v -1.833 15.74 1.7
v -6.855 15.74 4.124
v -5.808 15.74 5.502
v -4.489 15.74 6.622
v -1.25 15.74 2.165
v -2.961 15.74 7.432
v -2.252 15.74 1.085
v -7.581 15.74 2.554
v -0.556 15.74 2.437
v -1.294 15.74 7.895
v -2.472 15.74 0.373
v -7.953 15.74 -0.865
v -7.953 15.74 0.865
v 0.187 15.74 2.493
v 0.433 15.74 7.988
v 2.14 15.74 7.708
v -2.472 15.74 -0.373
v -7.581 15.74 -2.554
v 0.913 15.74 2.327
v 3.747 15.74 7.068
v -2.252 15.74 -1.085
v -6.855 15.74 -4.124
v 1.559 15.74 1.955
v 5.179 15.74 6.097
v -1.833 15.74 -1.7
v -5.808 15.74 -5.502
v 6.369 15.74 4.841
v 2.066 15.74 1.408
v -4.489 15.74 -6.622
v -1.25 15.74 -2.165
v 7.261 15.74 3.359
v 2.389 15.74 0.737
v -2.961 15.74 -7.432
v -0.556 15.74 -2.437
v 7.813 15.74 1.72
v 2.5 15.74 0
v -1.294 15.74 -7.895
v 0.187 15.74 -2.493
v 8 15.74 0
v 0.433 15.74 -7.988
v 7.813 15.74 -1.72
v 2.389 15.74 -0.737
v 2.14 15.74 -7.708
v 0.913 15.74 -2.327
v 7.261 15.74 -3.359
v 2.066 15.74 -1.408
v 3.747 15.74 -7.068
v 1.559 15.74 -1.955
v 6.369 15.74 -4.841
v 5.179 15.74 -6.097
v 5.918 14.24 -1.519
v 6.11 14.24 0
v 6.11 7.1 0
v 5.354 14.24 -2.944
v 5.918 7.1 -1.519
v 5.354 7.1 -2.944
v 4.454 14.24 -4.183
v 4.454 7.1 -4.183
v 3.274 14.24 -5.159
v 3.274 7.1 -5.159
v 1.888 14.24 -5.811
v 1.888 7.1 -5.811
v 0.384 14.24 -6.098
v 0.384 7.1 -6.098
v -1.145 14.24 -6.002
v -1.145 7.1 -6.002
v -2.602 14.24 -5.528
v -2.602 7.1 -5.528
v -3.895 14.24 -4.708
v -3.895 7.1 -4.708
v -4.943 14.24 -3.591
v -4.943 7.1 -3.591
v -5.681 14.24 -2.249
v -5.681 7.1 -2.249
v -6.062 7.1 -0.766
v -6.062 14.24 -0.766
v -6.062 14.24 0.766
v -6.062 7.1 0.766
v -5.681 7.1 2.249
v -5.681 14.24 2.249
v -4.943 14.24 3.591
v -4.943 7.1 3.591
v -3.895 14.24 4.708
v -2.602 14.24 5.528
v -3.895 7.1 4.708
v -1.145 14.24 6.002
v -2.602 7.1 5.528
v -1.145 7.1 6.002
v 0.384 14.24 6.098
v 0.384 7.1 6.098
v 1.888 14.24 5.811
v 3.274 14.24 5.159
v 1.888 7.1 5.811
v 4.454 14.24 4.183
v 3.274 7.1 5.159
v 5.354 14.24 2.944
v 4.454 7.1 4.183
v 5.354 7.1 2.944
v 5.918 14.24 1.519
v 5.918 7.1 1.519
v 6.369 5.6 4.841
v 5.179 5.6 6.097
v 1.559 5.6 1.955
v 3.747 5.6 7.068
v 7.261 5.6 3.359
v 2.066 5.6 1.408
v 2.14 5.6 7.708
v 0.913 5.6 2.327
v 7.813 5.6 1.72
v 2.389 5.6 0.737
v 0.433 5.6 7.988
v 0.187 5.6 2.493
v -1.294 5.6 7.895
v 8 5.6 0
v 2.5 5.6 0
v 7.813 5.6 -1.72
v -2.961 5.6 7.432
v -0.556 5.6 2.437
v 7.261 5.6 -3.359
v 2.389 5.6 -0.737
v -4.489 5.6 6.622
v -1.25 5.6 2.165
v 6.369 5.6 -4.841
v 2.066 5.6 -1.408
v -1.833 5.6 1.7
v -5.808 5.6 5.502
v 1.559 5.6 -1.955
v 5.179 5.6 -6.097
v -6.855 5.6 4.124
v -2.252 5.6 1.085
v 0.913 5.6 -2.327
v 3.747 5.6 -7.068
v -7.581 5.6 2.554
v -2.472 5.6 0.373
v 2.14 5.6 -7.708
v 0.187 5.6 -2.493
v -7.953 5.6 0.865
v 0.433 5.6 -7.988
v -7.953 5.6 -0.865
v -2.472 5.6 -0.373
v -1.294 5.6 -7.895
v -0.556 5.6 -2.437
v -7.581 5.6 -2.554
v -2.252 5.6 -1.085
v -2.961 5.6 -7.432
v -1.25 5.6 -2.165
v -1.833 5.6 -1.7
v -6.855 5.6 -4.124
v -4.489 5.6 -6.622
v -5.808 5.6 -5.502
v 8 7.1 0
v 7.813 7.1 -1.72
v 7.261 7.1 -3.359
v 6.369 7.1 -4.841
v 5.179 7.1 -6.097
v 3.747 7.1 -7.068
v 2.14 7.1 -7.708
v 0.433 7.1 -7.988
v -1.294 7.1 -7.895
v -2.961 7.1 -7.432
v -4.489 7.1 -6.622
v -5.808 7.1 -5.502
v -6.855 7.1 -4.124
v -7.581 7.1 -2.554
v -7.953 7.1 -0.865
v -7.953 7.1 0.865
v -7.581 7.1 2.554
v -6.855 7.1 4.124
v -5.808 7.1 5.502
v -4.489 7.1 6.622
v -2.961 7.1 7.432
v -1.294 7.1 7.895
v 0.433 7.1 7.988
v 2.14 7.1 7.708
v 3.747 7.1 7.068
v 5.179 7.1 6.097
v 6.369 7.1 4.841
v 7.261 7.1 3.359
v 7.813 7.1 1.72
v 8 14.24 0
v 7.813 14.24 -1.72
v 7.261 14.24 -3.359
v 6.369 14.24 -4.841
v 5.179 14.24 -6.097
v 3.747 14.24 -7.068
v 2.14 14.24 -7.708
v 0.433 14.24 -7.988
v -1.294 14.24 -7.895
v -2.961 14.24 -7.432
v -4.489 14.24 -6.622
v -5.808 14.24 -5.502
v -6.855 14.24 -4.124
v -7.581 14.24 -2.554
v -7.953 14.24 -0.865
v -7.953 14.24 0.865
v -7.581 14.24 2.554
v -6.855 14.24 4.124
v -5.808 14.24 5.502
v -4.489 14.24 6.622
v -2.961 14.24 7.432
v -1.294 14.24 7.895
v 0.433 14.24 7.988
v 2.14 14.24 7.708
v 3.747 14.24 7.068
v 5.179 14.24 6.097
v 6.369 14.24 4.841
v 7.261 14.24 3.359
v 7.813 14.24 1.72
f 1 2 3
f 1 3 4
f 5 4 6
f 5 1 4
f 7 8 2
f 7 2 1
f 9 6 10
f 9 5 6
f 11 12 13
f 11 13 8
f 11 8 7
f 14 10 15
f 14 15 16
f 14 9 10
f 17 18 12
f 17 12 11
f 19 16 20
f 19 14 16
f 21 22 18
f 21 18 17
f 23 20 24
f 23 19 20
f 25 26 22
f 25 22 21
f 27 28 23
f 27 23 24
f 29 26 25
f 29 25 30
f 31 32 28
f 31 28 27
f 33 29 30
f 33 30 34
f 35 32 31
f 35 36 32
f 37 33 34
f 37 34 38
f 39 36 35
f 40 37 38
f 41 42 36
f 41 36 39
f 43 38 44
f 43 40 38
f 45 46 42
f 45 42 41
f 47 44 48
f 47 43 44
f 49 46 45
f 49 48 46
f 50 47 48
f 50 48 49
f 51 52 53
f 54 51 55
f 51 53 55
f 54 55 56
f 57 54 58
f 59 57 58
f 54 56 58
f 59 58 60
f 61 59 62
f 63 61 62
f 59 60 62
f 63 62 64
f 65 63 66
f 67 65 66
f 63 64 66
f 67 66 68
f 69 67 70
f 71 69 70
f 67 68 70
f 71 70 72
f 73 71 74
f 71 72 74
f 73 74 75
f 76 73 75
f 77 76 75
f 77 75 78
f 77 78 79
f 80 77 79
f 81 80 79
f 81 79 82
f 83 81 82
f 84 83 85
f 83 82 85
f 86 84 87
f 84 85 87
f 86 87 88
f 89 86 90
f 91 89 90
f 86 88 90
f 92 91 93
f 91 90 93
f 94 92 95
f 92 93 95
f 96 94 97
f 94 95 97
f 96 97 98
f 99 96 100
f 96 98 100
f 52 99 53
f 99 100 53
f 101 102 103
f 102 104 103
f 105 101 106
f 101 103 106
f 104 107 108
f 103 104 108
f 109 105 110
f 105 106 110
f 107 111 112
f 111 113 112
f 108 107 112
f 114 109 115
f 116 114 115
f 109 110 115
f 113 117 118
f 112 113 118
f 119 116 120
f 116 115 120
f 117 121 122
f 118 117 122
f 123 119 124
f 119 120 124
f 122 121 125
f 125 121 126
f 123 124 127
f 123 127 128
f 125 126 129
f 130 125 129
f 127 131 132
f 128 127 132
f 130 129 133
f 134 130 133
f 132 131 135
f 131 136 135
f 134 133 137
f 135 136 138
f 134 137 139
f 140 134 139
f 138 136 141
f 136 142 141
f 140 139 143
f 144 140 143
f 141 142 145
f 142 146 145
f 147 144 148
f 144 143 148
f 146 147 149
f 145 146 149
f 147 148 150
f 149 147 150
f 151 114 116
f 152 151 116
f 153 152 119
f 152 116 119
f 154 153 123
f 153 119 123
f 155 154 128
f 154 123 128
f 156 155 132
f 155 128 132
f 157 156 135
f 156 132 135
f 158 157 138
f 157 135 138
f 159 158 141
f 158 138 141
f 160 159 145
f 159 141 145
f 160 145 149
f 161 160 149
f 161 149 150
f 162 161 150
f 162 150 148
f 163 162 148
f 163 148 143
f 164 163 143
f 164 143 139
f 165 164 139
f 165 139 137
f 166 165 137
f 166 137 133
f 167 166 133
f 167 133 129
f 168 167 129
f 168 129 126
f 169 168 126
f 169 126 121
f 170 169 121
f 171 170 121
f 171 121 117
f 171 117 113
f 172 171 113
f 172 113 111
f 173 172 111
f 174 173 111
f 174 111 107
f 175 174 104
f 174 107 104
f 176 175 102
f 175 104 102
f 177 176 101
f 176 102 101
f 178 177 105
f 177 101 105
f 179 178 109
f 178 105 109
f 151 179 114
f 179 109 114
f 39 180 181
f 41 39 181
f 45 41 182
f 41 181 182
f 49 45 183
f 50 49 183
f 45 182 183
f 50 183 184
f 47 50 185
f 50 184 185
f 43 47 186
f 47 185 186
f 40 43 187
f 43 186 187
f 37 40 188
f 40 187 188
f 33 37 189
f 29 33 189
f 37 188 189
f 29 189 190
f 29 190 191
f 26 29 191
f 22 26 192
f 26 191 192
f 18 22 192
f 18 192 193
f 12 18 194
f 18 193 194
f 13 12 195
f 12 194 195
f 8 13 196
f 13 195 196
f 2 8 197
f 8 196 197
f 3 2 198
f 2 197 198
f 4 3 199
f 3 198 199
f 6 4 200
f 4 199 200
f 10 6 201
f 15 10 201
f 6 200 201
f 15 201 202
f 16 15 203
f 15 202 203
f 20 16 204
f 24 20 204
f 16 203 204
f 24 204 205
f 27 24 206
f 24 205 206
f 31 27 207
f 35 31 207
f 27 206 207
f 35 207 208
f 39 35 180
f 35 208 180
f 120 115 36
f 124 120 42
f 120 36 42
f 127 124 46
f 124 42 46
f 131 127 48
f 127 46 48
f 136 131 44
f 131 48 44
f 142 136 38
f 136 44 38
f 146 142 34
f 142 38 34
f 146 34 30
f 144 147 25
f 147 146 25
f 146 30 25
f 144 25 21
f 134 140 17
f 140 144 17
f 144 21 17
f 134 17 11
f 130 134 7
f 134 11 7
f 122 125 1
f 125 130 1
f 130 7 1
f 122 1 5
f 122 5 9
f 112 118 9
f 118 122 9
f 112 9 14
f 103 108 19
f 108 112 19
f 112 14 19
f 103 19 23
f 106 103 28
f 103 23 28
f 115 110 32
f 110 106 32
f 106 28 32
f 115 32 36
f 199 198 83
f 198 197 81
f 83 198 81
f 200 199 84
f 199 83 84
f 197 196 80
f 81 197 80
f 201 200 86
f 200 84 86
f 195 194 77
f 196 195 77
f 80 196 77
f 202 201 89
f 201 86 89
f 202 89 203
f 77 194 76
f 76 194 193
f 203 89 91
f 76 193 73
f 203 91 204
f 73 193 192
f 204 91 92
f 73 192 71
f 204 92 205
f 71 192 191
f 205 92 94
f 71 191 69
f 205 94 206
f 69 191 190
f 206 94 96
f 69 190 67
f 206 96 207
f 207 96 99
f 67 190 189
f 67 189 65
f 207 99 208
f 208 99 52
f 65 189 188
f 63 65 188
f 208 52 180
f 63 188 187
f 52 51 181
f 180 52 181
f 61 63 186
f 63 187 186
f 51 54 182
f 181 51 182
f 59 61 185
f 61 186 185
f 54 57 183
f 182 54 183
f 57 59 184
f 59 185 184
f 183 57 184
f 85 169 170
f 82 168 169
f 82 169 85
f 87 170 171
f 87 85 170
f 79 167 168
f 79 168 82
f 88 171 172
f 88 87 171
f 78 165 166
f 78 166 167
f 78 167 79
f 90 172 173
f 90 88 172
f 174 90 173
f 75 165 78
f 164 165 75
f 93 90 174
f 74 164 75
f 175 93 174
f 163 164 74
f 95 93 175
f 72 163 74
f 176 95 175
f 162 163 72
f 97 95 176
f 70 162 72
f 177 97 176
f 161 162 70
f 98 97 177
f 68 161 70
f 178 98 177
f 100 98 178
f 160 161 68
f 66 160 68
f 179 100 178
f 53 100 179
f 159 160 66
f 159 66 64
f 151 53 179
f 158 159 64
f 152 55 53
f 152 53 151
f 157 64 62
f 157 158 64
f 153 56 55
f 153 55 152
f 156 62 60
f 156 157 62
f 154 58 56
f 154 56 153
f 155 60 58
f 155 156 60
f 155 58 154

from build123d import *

# Parameters (mm, degrees)
SKETCH1_R               = 8
BOSS_EXTRUDE1_DEPTH     = 7.1
SKETCH2_R               = 6.11
BOSS_EXTRUDE2_DEPTH     = 7.14
SKETCH5_R               = 2.5
CUT_EXTRUDE2_DEPTH      = 16
SKETCH8_R               = 8
BOSS_EXTRUDE4_DEPTH     = 1.5
SKETCH9_R               = 2.5
CUT_EXTRUDE4_DEPTH      = 15.74
SKETCH10_W              = 16
SKETCH10_H              = 6
CUT_EXTRUDE5_DEPTH      = 10
CUT_EXTRUDE5_DEPTH_BACK = 10


with BuildPart() as part:
    # Sketch1 → Boss-Extrude1 (new body)
    with BuildSketch(Plane(origin=(0, 0, 0), x_dir=(1, 0, 0), z_dir=(0, 1, 0))):
        Circle(SKETCH1_R)
    extrude(amount=BOSS_EXTRUDE1_DEPTH)

    # Sketch2 → Boss-Extrude2 (add)
    with BuildSketch(Plane(origin=(0, 7.1, 0), x_dir=(1, 0, 0), z_dir=(0, 1, 0))):
        Circle(SKETCH2_R)
    extrude(amount=BOSS_EXTRUDE2_DEPTH)

    # Sketch5 → Cut-Extrude2 (cut)
    with BuildSketch(Plane.XZ):
        Circle(SKETCH5_R)
    extrude(amount=-CUT_EXTRUDE2_DEPTH, mode=Mode.SUBTRACT)

    # Sketch8 → Boss-Extrude4 (add)
    with BuildSketch(Plane(origin=(0, 14.24, 0), x_dir=(1, 0, 0), z_dir=(0, 1, 0))):
        Circle(SKETCH8_R)
    extrude(amount=BOSS_EXTRUDE4_DEPTH)

    # Sketch9 → Cut-Extrude4 (cut)
    with BuildSketch(Plane(origin=(0, 15.74, 0), x_dir=(1, 0, 0), z_dir=(0, 1, 0))):
        Circle(SKETCH9_R)
    extrude(amount=-CUT_EXTRUDE4_DEPTH, mode=Mode.SUBTRACT)

    # Sketch10 → Cut-Extrude5 (cut, two sides)
    with BuildSketch(Plane(origin=(0, 0, 0), x_dir=(0, 0, -1), z_dir=(1, 0, 0))) as cut_extrude5_sk:
        with Locations((0, 2.6)):
            Rectangle(SKETCH10_W, SKETCH10_H)
    extrude(amount=CUT_EXTRUDE5_DEPTH, mode=Mode.SUBTRACT)
    extrude(cut_extrude5_sk.sketch, amount=-CUT_EXTRUDE5_DEPTH_BACK, mode=Mode.SUBTRACT)


solid = part.part
